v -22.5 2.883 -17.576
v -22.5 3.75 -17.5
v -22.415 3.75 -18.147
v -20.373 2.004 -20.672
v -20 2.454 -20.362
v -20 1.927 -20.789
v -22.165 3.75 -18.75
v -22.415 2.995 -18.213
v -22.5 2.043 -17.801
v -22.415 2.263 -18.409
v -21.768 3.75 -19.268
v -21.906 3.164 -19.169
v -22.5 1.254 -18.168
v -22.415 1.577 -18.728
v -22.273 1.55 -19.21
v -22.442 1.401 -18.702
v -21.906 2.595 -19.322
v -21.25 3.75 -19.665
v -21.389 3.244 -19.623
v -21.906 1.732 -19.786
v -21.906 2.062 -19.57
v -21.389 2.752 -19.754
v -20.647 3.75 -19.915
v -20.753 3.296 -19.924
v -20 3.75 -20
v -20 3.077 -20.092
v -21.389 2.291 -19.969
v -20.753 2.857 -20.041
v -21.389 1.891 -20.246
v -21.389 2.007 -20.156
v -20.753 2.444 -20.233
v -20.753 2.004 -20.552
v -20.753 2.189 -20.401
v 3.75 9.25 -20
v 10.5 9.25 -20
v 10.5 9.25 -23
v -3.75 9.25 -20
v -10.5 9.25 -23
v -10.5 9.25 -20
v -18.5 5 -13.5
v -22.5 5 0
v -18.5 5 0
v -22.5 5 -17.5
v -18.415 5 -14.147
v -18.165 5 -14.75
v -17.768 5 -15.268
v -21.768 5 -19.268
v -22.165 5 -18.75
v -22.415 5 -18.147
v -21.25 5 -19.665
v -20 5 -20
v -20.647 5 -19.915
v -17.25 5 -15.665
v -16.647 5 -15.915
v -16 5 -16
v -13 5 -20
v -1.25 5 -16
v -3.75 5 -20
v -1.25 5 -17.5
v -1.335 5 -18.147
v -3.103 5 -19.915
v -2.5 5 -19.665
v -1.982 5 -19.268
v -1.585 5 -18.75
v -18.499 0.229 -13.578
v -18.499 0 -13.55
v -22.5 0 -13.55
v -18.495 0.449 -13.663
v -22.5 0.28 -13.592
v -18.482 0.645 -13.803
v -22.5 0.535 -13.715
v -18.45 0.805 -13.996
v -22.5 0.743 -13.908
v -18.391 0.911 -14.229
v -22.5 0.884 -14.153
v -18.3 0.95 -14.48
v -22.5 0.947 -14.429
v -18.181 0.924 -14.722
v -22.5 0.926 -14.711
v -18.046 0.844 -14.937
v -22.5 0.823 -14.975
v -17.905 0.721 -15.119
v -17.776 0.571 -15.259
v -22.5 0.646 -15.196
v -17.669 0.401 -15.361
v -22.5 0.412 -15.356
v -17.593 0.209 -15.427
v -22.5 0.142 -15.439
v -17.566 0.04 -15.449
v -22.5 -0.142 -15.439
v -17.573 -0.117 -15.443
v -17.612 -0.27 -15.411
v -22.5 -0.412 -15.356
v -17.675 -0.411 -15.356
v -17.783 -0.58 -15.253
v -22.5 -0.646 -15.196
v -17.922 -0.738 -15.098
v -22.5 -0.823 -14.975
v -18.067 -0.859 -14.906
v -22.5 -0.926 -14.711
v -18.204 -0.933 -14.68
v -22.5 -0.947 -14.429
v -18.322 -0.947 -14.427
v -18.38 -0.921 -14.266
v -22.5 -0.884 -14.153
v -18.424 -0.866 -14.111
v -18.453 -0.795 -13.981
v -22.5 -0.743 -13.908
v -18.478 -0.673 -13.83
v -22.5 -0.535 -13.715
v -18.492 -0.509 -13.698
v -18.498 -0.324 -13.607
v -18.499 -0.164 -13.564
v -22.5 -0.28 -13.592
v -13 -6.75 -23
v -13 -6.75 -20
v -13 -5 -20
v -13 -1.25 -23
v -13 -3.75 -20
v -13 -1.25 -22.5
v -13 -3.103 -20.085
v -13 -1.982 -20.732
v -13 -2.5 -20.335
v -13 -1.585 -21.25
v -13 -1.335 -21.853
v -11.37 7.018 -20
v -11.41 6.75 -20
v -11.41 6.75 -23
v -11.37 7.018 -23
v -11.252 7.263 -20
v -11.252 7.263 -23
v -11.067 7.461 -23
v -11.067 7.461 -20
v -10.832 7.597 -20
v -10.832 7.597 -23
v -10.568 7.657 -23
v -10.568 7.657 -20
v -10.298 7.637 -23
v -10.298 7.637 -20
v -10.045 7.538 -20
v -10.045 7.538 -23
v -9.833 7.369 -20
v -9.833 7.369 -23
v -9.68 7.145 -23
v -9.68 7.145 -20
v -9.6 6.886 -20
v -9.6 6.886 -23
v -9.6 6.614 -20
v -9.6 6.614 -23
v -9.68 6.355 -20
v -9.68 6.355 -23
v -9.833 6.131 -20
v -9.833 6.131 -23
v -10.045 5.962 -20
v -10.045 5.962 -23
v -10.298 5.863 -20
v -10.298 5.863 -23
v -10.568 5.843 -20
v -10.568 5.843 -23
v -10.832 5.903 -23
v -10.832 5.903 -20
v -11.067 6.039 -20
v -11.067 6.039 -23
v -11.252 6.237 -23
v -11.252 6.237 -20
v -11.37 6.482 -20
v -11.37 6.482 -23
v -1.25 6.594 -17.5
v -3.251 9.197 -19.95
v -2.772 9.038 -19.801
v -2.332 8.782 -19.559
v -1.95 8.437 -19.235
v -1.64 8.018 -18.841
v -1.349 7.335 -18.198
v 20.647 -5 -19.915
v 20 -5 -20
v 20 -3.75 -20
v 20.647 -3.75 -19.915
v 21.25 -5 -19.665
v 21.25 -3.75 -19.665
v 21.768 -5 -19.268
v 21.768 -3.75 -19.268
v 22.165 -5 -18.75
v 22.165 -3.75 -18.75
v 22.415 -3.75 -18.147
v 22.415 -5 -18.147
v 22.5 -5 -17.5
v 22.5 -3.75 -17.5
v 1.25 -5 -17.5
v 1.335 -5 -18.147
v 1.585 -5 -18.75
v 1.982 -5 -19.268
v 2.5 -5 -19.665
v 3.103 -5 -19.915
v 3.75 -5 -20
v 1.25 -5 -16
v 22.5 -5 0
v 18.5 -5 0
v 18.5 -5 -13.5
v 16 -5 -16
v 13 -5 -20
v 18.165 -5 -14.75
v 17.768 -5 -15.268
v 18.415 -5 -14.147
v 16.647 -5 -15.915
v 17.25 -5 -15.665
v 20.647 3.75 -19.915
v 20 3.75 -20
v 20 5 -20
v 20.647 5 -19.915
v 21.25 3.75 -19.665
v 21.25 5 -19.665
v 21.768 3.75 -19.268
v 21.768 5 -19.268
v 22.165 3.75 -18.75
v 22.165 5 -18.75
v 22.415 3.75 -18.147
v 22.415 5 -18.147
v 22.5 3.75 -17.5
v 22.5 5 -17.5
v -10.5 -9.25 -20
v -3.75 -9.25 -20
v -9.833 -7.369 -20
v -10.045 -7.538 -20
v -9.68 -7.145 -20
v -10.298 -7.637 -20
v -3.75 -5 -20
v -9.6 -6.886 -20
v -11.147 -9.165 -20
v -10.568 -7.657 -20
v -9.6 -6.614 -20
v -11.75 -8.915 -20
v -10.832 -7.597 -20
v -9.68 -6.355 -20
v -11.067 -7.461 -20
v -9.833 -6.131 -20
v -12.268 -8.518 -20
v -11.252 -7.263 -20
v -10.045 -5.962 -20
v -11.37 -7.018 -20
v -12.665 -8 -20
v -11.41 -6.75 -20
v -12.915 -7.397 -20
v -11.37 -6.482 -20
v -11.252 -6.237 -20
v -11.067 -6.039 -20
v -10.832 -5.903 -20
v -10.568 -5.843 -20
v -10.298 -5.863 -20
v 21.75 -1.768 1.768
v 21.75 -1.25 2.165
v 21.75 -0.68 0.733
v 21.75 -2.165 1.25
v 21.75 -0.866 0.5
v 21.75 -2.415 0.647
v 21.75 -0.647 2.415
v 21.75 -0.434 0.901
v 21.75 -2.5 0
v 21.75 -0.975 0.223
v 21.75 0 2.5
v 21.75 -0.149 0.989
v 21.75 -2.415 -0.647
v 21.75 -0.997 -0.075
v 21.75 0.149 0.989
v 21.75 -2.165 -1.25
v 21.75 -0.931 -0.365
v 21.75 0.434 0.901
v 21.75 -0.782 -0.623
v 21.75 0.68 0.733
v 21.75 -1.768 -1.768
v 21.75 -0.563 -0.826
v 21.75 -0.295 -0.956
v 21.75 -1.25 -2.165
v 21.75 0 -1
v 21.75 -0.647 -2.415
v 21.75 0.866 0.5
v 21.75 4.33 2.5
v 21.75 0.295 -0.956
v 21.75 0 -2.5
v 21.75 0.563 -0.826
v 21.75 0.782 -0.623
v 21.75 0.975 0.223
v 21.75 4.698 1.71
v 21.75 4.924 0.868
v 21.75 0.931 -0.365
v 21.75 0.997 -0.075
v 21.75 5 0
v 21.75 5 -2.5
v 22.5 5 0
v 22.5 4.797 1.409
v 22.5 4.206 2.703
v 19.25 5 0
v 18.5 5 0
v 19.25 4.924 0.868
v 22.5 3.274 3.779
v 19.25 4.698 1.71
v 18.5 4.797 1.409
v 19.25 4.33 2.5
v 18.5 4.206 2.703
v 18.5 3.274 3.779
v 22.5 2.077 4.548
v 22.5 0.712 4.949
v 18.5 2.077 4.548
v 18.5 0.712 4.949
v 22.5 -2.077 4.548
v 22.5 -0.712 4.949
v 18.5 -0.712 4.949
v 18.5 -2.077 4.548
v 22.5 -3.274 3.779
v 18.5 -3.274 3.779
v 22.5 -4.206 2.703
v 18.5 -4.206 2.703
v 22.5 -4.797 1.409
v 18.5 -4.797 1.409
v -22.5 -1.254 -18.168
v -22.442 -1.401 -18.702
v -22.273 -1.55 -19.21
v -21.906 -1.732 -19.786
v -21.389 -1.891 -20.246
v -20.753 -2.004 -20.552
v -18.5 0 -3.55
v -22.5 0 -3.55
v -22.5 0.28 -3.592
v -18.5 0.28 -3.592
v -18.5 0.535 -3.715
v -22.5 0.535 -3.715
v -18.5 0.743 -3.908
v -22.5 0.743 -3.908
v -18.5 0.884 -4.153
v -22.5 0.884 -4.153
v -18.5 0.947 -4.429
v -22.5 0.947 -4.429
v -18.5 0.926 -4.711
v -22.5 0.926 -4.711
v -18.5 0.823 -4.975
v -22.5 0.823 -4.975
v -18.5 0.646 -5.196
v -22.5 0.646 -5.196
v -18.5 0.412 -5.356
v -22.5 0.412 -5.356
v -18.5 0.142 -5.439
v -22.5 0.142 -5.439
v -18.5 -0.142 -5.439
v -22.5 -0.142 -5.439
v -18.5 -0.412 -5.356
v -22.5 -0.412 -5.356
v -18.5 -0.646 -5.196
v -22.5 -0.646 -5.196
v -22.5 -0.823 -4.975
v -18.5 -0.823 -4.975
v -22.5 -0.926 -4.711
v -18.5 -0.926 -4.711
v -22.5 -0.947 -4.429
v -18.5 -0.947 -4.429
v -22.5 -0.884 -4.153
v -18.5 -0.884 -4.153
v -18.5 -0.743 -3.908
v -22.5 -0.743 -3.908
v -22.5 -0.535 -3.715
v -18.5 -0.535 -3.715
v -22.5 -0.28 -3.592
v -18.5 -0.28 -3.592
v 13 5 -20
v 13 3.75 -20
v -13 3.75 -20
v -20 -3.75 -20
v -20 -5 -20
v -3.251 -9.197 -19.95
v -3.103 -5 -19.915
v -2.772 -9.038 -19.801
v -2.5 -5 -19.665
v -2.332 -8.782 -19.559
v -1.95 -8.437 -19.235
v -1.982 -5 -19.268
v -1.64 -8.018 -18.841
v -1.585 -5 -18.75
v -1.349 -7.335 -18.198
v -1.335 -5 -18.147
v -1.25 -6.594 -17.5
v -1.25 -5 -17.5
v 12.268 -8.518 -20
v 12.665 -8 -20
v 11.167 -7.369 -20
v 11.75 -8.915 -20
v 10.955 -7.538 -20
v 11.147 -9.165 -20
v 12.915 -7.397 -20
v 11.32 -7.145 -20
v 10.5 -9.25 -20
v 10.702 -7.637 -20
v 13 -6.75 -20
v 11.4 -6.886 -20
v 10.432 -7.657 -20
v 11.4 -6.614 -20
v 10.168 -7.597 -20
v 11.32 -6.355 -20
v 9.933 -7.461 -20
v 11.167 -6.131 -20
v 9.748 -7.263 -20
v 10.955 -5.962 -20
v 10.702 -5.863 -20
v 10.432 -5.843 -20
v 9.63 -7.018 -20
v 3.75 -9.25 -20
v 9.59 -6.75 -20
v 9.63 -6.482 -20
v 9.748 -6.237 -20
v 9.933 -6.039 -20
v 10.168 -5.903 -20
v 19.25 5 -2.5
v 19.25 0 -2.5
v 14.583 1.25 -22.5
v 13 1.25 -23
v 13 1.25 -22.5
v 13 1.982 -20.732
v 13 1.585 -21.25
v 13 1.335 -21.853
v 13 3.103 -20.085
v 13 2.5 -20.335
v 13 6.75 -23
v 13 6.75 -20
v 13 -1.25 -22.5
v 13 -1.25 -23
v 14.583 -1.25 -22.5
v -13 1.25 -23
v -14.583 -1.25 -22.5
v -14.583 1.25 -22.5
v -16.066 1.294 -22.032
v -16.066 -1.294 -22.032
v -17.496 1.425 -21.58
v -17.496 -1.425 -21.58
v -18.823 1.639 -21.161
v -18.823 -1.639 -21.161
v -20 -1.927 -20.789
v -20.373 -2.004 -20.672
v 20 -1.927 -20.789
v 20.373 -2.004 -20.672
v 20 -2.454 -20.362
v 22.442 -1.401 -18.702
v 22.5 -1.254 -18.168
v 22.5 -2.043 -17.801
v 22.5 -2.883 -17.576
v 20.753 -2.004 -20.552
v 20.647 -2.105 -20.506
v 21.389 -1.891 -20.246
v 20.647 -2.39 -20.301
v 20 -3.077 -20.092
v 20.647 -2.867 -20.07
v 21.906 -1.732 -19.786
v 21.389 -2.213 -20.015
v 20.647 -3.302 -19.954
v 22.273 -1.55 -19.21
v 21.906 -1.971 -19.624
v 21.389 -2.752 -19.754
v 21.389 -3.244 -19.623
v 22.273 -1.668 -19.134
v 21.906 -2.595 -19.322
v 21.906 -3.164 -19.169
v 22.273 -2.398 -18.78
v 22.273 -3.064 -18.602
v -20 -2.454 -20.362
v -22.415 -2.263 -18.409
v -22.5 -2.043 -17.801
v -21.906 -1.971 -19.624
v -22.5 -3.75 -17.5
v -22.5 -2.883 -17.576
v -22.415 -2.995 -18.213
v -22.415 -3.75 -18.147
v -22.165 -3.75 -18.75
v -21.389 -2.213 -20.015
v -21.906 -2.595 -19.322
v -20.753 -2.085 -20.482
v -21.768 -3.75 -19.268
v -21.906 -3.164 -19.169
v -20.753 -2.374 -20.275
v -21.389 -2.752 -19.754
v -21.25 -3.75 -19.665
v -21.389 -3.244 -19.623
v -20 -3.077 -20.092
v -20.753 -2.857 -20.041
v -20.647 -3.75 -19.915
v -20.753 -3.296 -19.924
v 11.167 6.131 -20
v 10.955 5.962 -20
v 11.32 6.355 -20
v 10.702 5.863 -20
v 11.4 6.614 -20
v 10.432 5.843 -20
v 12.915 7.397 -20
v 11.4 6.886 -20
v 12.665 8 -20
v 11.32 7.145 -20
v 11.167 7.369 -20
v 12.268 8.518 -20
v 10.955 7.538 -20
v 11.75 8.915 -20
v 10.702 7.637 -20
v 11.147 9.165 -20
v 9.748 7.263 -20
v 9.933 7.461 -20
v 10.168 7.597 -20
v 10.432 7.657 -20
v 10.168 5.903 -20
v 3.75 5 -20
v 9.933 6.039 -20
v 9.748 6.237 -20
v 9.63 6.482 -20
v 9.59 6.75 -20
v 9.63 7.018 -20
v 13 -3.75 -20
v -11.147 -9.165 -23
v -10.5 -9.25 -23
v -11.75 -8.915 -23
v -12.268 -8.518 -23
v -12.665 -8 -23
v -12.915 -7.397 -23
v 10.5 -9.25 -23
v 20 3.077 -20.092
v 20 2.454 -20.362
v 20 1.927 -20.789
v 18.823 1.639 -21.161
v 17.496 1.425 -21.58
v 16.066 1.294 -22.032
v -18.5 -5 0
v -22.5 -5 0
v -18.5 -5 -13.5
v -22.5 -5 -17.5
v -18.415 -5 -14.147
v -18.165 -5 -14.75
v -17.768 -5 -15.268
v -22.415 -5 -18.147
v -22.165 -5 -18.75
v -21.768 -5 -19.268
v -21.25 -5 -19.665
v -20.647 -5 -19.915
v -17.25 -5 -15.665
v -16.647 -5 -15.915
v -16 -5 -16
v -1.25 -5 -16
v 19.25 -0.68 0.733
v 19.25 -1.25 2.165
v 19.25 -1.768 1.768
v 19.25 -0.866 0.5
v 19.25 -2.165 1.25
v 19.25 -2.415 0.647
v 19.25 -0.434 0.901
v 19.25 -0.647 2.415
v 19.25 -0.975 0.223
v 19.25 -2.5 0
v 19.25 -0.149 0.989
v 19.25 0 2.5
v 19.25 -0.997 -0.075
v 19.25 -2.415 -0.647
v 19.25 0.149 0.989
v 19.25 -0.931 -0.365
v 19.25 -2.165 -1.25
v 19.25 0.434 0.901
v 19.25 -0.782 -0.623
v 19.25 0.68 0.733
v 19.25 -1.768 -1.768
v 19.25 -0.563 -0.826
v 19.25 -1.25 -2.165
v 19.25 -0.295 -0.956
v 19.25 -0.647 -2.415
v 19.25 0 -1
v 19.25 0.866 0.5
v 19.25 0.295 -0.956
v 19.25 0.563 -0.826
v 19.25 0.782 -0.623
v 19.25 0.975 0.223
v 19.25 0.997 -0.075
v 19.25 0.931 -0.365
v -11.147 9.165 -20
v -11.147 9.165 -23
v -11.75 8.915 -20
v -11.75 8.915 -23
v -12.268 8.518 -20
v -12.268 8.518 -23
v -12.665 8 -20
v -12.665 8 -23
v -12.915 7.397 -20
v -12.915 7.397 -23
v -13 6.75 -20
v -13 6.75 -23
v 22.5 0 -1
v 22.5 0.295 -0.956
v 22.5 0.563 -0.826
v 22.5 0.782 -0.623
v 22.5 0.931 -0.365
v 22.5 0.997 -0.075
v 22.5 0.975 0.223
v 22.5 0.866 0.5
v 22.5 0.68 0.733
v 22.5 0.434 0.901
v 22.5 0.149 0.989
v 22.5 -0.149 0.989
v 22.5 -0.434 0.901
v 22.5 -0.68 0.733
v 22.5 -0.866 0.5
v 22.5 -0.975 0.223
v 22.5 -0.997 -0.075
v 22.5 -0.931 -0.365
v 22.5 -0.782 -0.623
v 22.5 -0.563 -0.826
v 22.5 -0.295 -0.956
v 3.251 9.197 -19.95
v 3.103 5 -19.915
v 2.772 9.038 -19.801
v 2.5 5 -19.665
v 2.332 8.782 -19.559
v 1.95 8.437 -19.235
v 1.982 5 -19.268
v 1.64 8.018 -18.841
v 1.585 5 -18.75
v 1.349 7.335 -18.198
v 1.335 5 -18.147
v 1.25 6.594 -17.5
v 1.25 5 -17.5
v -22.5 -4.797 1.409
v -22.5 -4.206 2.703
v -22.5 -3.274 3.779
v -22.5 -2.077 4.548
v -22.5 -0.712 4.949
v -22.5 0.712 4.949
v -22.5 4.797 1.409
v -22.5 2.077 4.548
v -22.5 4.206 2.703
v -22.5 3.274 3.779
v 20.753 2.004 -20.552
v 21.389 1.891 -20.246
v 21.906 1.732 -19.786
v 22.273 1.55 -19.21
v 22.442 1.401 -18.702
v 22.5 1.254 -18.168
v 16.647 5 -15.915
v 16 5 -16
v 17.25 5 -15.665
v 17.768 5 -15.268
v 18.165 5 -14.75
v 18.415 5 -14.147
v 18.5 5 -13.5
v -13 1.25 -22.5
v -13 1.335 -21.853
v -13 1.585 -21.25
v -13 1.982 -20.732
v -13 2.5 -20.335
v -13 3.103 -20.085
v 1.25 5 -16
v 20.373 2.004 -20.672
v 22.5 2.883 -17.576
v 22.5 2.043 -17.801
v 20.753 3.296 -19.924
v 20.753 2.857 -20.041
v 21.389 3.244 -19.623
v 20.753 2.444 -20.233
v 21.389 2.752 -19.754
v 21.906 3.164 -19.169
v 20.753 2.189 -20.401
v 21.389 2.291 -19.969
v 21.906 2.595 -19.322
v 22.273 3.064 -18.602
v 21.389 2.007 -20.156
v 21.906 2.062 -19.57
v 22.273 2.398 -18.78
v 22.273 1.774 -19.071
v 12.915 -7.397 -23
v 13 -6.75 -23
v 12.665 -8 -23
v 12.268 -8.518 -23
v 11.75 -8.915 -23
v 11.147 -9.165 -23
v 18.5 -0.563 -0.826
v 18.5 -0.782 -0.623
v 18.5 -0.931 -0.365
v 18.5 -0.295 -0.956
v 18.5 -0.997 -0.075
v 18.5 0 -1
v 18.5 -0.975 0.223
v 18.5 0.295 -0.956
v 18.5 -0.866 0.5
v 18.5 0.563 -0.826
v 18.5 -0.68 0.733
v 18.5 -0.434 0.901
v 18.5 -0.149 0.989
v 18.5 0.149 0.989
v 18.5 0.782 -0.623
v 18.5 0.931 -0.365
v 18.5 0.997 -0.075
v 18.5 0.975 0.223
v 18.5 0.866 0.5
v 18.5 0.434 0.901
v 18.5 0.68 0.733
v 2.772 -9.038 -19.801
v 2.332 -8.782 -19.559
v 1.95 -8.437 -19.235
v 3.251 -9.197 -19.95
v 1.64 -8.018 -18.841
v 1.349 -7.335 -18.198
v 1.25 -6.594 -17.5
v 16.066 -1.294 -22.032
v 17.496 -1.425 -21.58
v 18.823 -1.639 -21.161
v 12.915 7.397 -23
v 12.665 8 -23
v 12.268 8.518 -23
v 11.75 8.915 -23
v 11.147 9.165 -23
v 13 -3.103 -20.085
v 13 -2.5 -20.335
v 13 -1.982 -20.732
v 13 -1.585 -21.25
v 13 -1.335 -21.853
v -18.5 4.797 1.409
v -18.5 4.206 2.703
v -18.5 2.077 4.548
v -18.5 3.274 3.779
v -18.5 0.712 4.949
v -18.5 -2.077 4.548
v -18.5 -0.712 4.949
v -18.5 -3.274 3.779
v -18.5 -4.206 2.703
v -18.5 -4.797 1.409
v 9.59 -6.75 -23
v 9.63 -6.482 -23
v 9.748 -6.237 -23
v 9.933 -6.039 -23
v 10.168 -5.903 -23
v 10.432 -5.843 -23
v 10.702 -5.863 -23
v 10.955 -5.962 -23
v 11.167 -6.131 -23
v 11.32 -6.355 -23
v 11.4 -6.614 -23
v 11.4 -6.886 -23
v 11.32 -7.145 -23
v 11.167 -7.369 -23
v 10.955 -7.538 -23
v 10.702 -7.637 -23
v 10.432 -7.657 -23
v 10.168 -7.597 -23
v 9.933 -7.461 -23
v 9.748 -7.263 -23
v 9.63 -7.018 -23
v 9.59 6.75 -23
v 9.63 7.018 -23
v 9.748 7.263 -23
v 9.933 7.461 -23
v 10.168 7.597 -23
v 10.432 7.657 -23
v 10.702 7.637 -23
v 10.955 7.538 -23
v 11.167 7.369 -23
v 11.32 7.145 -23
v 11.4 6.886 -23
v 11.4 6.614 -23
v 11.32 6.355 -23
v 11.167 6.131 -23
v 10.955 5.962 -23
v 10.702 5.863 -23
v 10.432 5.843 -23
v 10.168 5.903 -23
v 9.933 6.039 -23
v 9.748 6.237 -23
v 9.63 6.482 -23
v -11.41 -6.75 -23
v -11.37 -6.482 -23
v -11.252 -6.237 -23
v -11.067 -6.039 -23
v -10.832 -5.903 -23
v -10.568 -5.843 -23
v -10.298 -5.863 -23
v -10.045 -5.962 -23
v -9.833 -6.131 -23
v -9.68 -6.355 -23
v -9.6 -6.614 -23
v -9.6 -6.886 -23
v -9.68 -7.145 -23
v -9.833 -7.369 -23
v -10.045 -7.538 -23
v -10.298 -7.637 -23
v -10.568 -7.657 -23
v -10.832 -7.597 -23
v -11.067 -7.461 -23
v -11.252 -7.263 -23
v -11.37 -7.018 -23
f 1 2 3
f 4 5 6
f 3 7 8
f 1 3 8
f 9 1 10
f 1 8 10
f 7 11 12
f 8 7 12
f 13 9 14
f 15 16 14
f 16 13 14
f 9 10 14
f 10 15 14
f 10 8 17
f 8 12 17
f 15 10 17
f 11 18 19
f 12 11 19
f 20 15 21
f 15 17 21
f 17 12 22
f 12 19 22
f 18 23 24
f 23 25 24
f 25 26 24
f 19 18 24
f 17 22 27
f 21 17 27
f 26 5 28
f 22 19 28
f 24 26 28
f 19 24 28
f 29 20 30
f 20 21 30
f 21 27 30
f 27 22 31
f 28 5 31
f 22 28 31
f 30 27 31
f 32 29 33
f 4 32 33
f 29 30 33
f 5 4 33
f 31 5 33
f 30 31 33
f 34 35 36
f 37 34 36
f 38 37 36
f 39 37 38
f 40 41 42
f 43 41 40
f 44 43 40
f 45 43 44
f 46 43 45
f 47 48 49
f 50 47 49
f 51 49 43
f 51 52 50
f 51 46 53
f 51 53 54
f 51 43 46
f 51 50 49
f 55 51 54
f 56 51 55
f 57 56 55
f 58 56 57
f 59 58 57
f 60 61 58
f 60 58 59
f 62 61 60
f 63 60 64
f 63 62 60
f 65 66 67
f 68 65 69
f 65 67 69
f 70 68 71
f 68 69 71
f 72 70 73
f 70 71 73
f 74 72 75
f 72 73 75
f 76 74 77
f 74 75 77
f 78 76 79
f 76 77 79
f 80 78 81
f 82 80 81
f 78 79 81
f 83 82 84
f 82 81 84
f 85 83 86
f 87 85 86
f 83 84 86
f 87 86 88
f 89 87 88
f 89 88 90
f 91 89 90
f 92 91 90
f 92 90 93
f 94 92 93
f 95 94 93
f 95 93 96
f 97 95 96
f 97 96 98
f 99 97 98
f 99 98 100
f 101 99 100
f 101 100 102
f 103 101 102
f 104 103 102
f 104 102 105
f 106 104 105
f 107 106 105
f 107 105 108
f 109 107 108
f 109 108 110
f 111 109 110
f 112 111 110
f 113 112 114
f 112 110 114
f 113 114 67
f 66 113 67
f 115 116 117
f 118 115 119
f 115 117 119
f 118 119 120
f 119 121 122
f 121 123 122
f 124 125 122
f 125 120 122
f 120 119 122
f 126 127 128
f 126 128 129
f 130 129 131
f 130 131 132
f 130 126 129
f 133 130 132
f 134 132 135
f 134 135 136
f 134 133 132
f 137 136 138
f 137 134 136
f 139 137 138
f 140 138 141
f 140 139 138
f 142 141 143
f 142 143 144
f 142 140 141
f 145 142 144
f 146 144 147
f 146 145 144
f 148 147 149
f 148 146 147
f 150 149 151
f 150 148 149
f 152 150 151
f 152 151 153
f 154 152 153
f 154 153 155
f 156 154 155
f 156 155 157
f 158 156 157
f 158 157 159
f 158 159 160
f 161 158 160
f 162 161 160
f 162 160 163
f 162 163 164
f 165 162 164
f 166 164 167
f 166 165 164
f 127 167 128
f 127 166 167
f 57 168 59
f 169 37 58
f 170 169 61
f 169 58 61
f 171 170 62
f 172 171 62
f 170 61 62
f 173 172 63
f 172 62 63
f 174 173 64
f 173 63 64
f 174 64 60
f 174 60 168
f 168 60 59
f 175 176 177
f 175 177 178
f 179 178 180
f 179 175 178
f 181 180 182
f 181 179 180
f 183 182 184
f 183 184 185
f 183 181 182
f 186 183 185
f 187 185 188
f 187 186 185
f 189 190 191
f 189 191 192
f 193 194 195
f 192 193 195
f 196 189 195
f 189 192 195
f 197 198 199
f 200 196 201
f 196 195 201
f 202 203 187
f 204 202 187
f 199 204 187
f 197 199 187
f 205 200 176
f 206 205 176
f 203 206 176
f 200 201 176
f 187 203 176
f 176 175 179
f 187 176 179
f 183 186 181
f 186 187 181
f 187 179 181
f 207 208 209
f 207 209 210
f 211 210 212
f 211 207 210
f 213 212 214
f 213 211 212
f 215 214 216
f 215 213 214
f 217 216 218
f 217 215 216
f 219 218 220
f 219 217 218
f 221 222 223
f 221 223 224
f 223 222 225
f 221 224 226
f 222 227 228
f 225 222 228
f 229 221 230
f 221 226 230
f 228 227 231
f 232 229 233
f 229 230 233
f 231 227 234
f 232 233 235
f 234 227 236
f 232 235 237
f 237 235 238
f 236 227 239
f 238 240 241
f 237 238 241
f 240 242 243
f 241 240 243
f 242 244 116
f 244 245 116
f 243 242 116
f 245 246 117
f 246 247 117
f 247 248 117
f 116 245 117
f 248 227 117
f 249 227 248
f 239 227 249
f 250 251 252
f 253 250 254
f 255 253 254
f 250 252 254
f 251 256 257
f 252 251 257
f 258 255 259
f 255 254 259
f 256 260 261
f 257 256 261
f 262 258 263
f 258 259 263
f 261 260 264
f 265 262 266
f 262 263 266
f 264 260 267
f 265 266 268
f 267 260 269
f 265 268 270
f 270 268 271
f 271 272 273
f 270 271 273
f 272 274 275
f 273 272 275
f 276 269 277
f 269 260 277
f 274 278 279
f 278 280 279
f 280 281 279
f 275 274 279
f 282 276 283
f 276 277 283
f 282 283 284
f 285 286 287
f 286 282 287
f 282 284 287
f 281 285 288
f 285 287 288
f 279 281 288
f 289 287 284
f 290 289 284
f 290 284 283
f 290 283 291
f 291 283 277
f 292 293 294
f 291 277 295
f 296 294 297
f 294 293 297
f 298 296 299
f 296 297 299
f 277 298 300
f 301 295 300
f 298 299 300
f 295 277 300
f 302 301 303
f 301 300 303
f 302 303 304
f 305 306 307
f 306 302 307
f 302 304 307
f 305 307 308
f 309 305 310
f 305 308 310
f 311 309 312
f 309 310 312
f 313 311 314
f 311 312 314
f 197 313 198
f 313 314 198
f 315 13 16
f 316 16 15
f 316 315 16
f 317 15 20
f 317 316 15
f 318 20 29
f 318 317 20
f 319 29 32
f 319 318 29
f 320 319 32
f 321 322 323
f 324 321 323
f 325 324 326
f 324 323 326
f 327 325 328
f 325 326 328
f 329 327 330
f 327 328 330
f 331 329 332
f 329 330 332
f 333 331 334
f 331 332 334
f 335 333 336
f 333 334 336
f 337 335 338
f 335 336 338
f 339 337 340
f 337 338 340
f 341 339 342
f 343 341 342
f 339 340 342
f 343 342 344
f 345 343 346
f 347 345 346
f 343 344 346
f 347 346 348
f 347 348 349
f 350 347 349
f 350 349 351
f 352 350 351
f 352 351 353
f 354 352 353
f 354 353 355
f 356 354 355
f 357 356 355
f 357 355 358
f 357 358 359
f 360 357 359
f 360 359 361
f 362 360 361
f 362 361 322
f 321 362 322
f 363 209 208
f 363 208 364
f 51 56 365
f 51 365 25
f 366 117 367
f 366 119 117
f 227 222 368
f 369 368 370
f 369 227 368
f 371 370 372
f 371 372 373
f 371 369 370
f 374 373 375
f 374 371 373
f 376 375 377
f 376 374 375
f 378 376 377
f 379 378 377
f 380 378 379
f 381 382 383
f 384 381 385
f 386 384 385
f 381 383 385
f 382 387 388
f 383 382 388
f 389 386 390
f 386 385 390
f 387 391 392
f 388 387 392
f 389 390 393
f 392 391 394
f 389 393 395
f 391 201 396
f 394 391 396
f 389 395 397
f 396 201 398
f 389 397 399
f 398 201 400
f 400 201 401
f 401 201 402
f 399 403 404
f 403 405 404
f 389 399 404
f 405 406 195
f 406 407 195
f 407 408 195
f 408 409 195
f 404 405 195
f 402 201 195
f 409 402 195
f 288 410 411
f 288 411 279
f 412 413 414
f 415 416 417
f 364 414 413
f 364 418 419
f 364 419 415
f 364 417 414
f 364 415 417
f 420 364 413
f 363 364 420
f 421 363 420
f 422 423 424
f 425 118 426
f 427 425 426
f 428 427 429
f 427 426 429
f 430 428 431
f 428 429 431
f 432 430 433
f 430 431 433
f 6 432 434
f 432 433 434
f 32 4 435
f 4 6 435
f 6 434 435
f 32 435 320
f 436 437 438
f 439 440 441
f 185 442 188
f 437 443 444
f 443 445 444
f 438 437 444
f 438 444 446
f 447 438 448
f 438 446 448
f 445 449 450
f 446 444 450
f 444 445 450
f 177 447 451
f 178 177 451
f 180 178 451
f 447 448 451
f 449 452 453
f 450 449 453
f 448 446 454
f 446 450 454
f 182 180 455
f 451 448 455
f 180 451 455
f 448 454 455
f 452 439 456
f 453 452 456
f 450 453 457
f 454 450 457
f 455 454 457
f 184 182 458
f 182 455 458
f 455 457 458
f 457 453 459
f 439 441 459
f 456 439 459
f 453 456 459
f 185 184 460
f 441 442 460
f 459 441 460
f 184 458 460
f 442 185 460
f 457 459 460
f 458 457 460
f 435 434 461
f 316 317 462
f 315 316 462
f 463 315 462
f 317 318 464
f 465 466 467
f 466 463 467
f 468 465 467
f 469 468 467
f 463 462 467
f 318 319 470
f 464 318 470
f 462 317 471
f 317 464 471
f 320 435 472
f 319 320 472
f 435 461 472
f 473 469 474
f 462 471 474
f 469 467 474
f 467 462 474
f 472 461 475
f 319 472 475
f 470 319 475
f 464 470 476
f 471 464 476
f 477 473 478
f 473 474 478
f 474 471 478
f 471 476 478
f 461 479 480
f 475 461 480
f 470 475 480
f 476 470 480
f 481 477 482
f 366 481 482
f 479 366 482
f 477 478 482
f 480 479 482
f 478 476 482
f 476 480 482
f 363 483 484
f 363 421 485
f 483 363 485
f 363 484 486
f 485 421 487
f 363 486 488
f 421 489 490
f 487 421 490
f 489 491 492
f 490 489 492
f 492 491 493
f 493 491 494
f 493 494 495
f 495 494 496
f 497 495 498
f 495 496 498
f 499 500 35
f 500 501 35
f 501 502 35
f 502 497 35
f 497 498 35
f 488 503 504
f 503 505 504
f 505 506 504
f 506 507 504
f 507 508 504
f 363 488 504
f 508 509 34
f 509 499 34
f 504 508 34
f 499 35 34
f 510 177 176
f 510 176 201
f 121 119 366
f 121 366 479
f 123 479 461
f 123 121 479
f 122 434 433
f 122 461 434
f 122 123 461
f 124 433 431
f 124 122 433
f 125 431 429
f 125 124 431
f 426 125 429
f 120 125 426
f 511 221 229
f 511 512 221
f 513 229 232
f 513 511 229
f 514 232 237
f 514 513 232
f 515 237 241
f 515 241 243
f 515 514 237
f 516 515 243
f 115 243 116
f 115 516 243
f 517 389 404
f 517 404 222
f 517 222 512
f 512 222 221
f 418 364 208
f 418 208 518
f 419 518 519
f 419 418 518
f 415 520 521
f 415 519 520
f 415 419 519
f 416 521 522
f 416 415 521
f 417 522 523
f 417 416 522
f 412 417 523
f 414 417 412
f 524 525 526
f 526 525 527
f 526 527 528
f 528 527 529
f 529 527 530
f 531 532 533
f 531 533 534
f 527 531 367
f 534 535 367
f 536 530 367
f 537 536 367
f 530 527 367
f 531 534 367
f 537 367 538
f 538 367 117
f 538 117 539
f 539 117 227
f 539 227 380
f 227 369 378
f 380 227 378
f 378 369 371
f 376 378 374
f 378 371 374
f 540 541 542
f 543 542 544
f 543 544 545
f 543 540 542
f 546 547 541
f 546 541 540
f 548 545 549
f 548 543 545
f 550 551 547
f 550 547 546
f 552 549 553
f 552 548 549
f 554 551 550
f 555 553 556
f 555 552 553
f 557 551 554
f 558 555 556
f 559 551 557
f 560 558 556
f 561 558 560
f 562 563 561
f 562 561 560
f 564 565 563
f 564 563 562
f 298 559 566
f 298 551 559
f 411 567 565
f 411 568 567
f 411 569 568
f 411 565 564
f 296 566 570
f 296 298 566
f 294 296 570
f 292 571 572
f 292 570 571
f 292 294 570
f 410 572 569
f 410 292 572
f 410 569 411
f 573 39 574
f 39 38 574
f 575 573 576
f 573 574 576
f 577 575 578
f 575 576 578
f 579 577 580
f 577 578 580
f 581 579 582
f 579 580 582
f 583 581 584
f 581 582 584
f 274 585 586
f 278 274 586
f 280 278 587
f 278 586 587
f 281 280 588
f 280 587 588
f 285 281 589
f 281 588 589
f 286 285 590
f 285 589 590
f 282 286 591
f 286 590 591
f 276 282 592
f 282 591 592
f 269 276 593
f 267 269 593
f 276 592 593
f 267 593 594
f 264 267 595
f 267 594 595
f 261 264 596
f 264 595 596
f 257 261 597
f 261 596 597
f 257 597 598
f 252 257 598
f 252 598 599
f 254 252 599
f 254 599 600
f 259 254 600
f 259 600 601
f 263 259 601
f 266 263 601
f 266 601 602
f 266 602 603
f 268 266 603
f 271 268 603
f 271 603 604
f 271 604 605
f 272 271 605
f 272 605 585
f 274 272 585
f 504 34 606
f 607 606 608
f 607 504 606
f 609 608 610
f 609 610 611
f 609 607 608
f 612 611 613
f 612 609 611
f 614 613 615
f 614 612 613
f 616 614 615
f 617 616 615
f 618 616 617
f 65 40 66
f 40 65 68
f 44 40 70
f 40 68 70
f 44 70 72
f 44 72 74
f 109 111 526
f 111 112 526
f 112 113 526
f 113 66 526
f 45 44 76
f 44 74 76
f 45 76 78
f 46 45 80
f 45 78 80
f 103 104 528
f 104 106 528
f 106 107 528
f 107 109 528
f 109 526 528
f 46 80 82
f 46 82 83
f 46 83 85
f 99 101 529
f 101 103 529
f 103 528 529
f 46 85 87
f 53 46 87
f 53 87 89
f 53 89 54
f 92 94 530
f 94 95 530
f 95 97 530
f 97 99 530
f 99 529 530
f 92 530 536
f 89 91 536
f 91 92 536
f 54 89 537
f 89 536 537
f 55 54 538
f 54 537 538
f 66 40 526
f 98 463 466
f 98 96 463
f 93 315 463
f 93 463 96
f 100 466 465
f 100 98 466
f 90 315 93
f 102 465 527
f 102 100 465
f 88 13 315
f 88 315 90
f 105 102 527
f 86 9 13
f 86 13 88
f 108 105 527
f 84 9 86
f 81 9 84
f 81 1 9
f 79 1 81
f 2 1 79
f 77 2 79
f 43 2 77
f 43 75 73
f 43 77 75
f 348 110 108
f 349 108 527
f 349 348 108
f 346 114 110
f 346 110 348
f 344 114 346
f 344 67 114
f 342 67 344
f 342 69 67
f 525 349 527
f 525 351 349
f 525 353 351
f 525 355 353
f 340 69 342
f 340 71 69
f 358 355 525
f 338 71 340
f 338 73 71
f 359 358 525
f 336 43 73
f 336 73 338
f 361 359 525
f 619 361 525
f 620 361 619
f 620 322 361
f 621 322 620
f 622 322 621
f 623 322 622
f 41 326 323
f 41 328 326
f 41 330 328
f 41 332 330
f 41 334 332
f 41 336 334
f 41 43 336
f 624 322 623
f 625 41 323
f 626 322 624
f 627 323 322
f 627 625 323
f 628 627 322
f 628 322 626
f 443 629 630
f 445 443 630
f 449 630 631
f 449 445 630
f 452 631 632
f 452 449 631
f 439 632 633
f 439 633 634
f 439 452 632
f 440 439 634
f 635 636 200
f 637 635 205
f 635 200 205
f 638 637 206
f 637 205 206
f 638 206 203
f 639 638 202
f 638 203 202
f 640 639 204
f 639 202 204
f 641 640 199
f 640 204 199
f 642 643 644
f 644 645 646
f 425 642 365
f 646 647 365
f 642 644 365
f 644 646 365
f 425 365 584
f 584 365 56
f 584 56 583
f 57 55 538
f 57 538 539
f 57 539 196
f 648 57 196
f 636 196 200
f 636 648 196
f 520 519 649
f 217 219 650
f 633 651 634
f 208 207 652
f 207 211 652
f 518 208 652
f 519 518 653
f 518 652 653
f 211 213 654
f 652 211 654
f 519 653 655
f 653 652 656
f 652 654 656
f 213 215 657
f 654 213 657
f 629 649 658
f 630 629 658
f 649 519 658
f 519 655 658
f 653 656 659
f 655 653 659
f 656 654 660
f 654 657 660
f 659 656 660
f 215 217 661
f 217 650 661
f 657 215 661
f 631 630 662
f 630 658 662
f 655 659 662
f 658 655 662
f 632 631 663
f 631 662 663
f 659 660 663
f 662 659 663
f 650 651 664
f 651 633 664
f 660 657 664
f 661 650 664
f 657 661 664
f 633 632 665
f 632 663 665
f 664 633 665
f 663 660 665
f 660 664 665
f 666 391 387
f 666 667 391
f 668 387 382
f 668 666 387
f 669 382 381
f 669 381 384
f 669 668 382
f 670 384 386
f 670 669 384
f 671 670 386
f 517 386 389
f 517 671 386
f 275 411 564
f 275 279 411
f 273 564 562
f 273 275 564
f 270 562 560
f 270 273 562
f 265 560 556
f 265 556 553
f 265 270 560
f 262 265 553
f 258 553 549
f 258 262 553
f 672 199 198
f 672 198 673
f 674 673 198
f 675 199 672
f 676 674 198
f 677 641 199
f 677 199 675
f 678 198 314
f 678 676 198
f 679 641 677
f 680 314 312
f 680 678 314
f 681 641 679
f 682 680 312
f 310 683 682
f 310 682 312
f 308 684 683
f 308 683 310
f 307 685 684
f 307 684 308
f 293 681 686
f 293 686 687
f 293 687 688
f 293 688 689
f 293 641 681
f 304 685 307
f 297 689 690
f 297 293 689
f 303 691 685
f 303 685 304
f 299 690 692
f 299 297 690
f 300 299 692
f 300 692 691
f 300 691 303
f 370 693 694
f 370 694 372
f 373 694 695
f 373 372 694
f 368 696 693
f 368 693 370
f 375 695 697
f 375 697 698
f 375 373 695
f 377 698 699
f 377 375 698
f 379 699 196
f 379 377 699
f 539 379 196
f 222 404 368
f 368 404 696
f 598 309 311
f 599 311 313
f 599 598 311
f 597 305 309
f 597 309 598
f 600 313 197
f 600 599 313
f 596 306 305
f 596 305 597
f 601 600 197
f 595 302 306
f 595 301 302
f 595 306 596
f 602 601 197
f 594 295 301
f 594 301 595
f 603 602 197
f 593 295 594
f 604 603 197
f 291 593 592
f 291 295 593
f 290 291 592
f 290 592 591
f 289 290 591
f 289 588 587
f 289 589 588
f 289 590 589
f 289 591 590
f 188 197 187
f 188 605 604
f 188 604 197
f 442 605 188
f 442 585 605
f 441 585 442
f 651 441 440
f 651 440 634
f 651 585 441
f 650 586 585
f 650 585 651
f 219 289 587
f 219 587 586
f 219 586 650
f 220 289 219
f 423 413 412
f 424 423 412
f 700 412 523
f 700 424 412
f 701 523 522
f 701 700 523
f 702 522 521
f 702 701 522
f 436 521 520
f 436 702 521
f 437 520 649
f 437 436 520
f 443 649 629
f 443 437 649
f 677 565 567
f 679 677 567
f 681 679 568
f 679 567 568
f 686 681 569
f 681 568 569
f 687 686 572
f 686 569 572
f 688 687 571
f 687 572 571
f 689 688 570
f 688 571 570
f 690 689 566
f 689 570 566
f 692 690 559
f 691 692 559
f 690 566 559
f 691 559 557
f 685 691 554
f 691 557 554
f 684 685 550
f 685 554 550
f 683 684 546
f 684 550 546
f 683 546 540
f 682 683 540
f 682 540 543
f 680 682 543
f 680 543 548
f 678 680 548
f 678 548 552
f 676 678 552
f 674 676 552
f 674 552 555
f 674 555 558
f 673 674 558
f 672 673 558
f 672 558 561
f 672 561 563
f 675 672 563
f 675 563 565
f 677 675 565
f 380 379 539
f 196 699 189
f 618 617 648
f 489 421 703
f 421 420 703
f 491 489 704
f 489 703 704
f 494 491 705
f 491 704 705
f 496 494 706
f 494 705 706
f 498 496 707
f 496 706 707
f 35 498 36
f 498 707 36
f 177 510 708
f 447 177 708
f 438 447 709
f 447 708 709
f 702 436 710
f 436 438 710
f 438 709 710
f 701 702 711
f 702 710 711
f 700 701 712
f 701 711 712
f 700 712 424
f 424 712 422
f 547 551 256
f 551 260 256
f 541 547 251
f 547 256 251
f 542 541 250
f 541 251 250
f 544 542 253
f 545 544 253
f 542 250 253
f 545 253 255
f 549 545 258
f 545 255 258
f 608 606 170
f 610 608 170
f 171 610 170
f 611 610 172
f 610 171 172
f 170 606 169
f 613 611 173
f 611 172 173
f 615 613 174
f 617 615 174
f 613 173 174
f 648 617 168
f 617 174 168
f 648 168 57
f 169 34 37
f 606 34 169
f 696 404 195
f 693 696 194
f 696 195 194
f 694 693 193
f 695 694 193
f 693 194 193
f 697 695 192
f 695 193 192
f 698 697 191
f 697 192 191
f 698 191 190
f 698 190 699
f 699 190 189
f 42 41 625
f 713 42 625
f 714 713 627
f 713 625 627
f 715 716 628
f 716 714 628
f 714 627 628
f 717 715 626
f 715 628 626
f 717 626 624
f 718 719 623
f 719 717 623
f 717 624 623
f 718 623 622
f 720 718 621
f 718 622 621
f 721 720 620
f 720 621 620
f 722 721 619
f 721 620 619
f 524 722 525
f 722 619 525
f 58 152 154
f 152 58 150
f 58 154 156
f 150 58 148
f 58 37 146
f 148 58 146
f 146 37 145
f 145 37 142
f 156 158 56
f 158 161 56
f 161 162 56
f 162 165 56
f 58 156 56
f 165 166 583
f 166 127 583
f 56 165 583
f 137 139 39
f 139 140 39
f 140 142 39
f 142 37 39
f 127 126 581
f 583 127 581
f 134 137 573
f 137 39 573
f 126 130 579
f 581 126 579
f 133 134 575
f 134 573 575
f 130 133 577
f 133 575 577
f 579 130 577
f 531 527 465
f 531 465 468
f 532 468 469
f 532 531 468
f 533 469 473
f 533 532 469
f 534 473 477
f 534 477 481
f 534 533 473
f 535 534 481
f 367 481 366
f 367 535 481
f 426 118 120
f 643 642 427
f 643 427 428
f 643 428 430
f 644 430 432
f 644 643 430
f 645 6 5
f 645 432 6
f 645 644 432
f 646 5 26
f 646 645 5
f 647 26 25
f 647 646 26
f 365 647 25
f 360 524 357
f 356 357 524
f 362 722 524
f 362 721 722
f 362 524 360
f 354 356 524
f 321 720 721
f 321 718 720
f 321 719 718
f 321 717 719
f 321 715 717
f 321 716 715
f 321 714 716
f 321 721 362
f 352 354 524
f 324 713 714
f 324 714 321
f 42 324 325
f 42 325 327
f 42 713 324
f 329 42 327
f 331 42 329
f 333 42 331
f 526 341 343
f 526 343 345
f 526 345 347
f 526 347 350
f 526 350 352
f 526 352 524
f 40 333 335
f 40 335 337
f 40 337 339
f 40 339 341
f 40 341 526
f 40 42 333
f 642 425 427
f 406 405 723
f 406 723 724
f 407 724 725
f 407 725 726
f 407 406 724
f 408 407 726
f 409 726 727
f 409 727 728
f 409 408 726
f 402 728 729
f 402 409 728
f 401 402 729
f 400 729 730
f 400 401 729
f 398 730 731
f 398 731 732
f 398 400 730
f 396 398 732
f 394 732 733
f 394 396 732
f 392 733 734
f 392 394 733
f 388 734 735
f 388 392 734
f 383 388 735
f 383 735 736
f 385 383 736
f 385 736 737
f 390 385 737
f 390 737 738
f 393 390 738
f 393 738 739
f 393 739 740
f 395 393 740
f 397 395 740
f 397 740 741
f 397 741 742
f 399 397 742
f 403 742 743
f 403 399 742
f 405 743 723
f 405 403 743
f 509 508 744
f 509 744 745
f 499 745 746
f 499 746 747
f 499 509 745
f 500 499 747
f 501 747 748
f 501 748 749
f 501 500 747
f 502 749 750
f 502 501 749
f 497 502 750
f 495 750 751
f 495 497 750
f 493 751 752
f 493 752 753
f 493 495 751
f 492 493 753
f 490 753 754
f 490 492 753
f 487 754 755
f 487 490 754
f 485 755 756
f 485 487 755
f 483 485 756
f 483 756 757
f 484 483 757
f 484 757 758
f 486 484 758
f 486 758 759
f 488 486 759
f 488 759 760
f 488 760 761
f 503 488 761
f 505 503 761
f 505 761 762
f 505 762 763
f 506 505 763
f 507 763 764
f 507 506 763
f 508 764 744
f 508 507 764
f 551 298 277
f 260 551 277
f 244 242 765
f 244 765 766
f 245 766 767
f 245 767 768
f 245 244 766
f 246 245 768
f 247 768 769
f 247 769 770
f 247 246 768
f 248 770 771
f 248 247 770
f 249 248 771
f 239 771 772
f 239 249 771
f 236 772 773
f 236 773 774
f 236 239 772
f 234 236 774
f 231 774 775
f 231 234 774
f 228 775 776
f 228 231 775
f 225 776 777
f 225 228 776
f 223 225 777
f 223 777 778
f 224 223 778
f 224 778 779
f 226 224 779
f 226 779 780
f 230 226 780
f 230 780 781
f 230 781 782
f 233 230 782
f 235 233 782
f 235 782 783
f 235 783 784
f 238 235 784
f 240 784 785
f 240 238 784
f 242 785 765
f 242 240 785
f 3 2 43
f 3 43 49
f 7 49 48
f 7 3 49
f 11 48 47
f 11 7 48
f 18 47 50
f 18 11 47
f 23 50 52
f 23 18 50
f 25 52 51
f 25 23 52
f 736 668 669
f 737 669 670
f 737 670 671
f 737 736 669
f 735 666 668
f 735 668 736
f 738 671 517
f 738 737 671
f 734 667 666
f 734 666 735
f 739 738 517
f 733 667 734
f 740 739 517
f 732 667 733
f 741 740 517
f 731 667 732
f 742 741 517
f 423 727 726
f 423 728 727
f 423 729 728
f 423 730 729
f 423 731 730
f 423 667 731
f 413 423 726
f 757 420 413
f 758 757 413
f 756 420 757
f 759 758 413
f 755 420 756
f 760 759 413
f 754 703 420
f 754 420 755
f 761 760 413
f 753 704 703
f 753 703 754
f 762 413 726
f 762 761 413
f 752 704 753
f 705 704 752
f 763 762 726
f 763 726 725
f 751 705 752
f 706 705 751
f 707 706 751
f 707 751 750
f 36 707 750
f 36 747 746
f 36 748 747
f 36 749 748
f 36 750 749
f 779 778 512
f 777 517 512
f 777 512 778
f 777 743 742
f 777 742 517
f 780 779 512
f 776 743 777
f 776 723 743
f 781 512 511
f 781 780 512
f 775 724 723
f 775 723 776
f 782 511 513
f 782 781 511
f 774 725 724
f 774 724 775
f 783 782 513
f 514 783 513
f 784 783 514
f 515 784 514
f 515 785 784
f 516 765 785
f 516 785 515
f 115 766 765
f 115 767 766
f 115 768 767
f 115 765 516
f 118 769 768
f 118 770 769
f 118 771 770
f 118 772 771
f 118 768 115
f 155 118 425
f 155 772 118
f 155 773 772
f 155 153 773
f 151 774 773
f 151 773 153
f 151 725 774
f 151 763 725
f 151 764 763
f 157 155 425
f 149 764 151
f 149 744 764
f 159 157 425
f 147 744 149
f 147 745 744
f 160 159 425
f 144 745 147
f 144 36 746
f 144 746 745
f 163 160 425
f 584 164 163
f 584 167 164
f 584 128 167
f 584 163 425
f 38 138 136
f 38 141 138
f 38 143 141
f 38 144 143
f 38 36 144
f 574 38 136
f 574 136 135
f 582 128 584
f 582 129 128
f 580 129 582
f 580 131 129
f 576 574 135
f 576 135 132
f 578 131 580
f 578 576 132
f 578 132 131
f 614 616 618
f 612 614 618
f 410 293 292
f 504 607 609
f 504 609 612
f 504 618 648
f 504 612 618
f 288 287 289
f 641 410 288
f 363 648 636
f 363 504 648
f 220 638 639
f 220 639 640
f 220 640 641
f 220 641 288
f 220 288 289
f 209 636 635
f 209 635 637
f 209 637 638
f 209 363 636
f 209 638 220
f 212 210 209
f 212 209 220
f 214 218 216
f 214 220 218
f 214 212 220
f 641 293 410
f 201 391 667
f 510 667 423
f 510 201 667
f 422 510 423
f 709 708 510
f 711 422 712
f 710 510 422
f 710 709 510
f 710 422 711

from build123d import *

# Parameters (mm, degrees)
BOSS_EXTRU_1_DEPTH      = 5
ESQUISSE4_W             = 2.5
ESQUISSE4_H             = 5
ENL_V_MAT_EXTRU_1_DEPTH = 7.5
ENL_V_MAT_EXTRU_2_REACH = 51.497
ESQUISSE5_R             = 1
CONG_1_R                = 2.5
CONG_2_R                = 5
ESQUISSE6_W             = 26
ESQUISSE6_H             = 18.5
ESQUISSE6_R             = 0.91
BOSS_EXTRU_2_DEPTH      = 3
NERVURE4_REACH          = 35.479
ESQUISSE7_WALL_W        = 74.793384568
ESQUISSE7_WALL_H        = 2.5
NERVURE5_REACH          = 35.479
ESQUISSE8_WALL_W        = 78.919505224
ESQUISSE8_WALL_H        = 2.5
CONG_3_R                = 2.5
CONG_4_START            = -2.015218214
CONG_4_3_DEPTH          = 4.030436428
CONG_4_START_2          = 3.7499999
CONG_4_4_DEPTH          = 1.2500001
CONG_4_START_3          = -5
CONG_4_5_DEPTH          = 1.25
CONG_4_6_DEPTH          = 10
ENL_V_MAT_EXTRU_3_REACH = 53.377
ESQUISSE9_R             = 0.95


with BuildPart() as part:
    # Esquisse2 → Boss.-Extru.1 (new, symmetric)
    with BuildSketch(Plane(origin=(0, 0, 0), x_dir=(1, 0, 0), z_dir=(0, 1, 0))):
        Polygon((-18.5, -5), (-18.5, 16), (18.5, 16), (18.5, -5), (22.5, -5), (22.5, 20), (-22.5, 20), (-22.5, -5), align=None)
    extrude(amount=BOSS_EXTRU_1_DEPTH, both=True)

    # Esquisse4 → Enlèv. mat.-Extru.1 (cut)
    with BuildSketch(Plane(origin=(0, 5, 0), x_dir=(1, 0, 0), z_dir=(0, 1, 0))):
        with Locations((20.5, 0)):
            Rectangle(ESQUISSE4_W, ESQUISSE4_H)
    extrude(amount=-ENL_V_MAT_EXTRU_1_DEPTH, mode=Mode.SUBTRACT)

    # Enlèv. mat.-Extru.2: up to this face of the body (flat: up to its plane)
    enl_v_mat_extru_2_end = Plane(part.part.faces().sort_by_distance((18.5, 0, -5.5))[0])
    # Esquisse5 → Enlèv. mat.-Extru.2 (cut, up to the picked face)
    with BuildSketch(Plane(origin=(22.5, 0, 0), x_dir=(0, 0, -1), z_dir=(1, 0, 0)), mode=Mode.PRIVATE) as enl_v_mat_extru_2_sk1:
        Circle(ESQUISSE5_R)
    enl_v_mat_extru_2_tool1 = split(extrude(enl_v_mat_extru_2_sk1.sketch, amount=-ENL_V_MAT_EXTRU_2_REACH, mode=Mode.PRIVATE), bisect_by=enl_v_mat_extru_2_end, keep=Keep.BOTH, mode=Mode.PRIVATE)
    add(enl_v_mat_extru_2_tool1.solids().sort_by(Axis((22.5, 0, 0), (-1, 0, 0)))[0], mode=Mode.SUBTRACT)

    # Congé1
    cong_1_edges = [part.edges().sort_by_distance(p)[0] for p in [
        (20.5, -2.5, 2.5),
        (20.5, -2.5, -2.5),
    ]]
    fillet(cong_1_edges, radius=CONG_1_R - 0.0001)  # a hair under: the kernel refuses the full size

    # Congé2
    # the kernel refuses this fillet: 5 mm, written as the material it takes off along each edge
    with BuildSketch(Plane(origin=(-35, -5, 5), x_dir=(0, 1, 0), z_dir=(1, 0, 0)), Plane(origin=(-35, 5, 5), x_dir=(0, 0, -1), z_dir=(1, 0, 0)), Plane(origin=(6, -5, 5), x_dir=(0, 1, 0), z_dir=(1, 0, 0)), Plane(origin=(6, 5, 5), x_dir=(0, 0, -1), z_dir=(1, 0, 0))) as cong_2_piece_1:
        with BuildLine():
            CenterArc((CONG_2_R, -CONG_2_R), CONG_2_R, 90, 90)
            Line((0, -CONG_2_R), (0, 0))
            Line((0, 0), (CONG_2_R, 0))
        make_face()
    extrude(amount=29, mode=Mode.SUBTRACT)

    # Esquisse6 → Boss.-Extru.2 (add)
    with BuildSketch(Plane(origin=(0, 0, -20), x_dir=(-1, 0, 0), z_dir=(0, 0, -1))):
        Rectangle(ESQUISSE6_W, ESQUISSE6_H)
        with Locations((-10.5, 6.75)):
            Circle(ESQUISSE6_R, mode=Mode.SUBTRACT)
        with Locations((10.5, 6.75)):
            Circle(ESQUISSE6_R, mode=Mode.SUBTRACT)
        with Locations((10.5, -6.75)):
            Circle(ESQUISSE6_R, mode=Mode.SUBTRACT)
        with Locations((-10.5, -6.75)):
            Circle(ESQUISSE6_R, mode=Mode.SUBTRACT)
    extrude(amount=BOSS_EXTRU_2_DEPTH)

    # Esquisse7 wall → Nervure4 (add, up to next)
    with BuildSketch(Plane(origin=(0, 7.125, -18), x_dir=(0, -0.728199992693, 0.685364699005), z_dir=(0, -0.685364699005, -0.728199992693)), mode=Mode.PRIVATE) as nervure4_sk1:
        Rectangle(ESQUISSE7_WALL_W, ESQUISSE7_WALL_H)
    nervure4_tool1 = extrude(nervure4_sk1.sketch, amount=NERVURE4_REACH, mode=Mode.PRIVATE) - part.part
    nervure4 = nervure4_tool1.solids().sort_by_distance((0, 7.125, -18))[0]
    add(nervure4)

    # Symétrie1: Nervure4 across plane
    add(nervure4.mirror(Plane.ZX))

    # Esquisse8 wall → Nervure5 (add, up to next)
    with BuildSketch(Plane(origin=(17.75, 0, -21.5), x_dir=(0.953582665134, 0, 0.301131367937), z_dir=(0.301131367937, 0, -0.953582665134)), mode=Mode.PRIVATE) as nervure5_sk1:
        Rectangle(ESQUISSE8_WALL_W, ESQUISSE8_WALL_H)
    nervure5_tool1 = extrude(nervure5_sk1.sketch, amount=-NERVURE5_REACH, mode=Mode.PRIVATE) - part.part
    nervure5 = nervure5_tool1.solids().sort_by_distance((17.75, 0, -21.5))[0]
    add(nervure5)

    # Symétrie2: Nervure5 across plane
    add(nervure5.mirror(Plane(origin=(0, 0, 0), x_dir=(0, 0, 1), z_dir=(1, 0, 0))))

    # Congé3
    cong_3_edges = [part.edges().sort_by_distance(p)[0] for p in [
        (1.25, 7.125, -20),
        (-1.25, 7.125, -20),
        (-1.25, -7.125, -20),
        (1.25, -7.125, -20),
        (17.75, 1.25, -20),
        (17.75, -1.25, -20),
        (-17.75, -1.25, -20),
        (-17.75, 1.25, -20),
        (-13, -9.25, -21.5),
        (-13, 9.25, -21.5),
        (13, 9.25, -21.5),
        (13, -9.25, -21.5),
    ]]
    fillet(cong_3_edges, radius=CONG_3_R)

    # Congé4: read off the stored shape, not the designer's step
    # Congé4 outline → Congé4 (revolve, cut)
    with BuildSketch(Plane(origin=(0, 3.75, -22.5), x_dir=(0, 1, 0), z_dir=(0, 0, -1))):
        with BuildLine():
            Line((2.5, 22.5), (2.5, 20))
            ThreePointArc((2.5, 20), (3.232233047, 21.767766953), (5, 22.5))
            Line((5, 22.5), (2.5, 22.5))
        make_face()
        with BuildLine():
            ThreePointArc((5, -22.5), (3.232233047, -21.767766953), (2.5, -20))
            Line((2.5, -20), (2.5, -22.5))
            Line((2.5, -22.5), (5, -22.5))
        make_face()
    revolve(axis=Axis((0, 3.75, -22.5), (1, 0, 0)), mode=Mode.SUBTRACT)

    # Cong_4 2 outline → Cong_4 2 (revolve, cut)
    with BuildSketch(Plane(origin=(0, -3.75, -22.5), x_dir=(0, 1, 0), z_dir=(0, 0, -1))):
        with BuildLine():
            Line((2.5, 22.5), (2.5, 20))
            ThreePointArc((2.5, 20), (3.232233047, 21.767766953), (5, 22.5))
            Line((5, 22.5), (2.5, 22.5))
        make_face()
        with BuildLine():
            ThreePointArc((5, -22.5), (3.232233047, -21.767766953), (2.5, -20))
            Line((2.5, -20), (2.5, -22.5))
            Line((2.5, -22.5), (5, -22.5))
        make_face()
    revolve(axis=Axis((0, -3.75, -22.5), (1, 0, 0)), mode=Mode.SUBTRACT)

    # Cong_4 3 outline → Cong_4 3 (cut)
    with BuildSketch(Plane(origin=(0, 0, 0), x_dir=(1, 0, 0), z_dir=(0, 1, 0)).offset(CONG_4_START)):
        with BuildLine():
            Line((22.5, 18.167781731), (22.5, 15.999999998))
            Line((22.5, 15.999999998), (24, 15.999999998))
            Line((24, 15.999999998), (24, 19.52631579))
            Line((24, 19.52631579), (22.449089048, 20.016077143))
            Line((22.449089048, 20.016077143), (20.75282842, 20.551738394))
            ThreePointArc((20.75282842, 20.551738394), (22.016441302, 19.645605968), (22.5, 18.167781731))
        make_face()
        with BuildLine():
            Line((-24, 15.999999998), (-22.5, 15.999999998))
            Line((-22.5, 15.999999998), (-22.5, 18.167781731))
            ThreePointArc((-22.5, 18.167781731), (-22.016441302, 19.645605968), (-20.75282842, 20.551738394))
            Line((-20.75282842, 20.551738394), (-22.449089048, 20.016077143))
            Line((-22.449089048, 20.016077143), (-24, 19.52631579))
            Line((-24, 19.52631579), (-24, 15.999999998))
        make_face()
    extrude(amount=CONG_4_3_DEPTH, mode=Mode.SUBTRACT)

    # Cong_4 4 outline → Cong_4 4 (cut)
    with BuildSketch(Plane(origin=(0, 0, 0), x_dir=(1, 0, 0), z_dir=(0, 1, 0)).offset(CONG_4_START_2)):
        with BuildLine():
            Line((18.5, 20), (20, 20))
            ThreePointArc((20, 20), (21.767766953, 19.267766953), (22.5, 17.5))
            Line((22.5, 17.5), (22.5, 18.167781731))
            ThreePointArc((22.5, 18.167781731), (22.016441302, 19.645605968), (20.75282842, 20.551738394))
            Line((20.75282842, 20.551738394), (18.5, 21.263157895))
            Line((18.5, 21.263157895), (18.5, 20))
        make_face()
        with BuildLine():
            Line((-18.5, 20), (-18.5, 21.263157895))
            Line((-18.5, 21.263157895), (-20.75282842, 20.551738394))
            ThreePointArc((-20.75282842, 20.551738394), (-22.016441302, 19.645605968), (-22.5, 18.167781731))
            Line((-22.5, 18.167781731), (-22.5, 17.5))
            ThreePointArc((-22.5, 17.5), (-21.767766953, 19.267766953), (-20, 20))
            Line((-20, 20), (-18.5, 20))
        make_face()
    extrude(amount=CONG_4_4_DEPTH, mode=Mode.SUBTRACT)

    # Cong_4 5 outline → Cong_4 5 (cut)
    with BuildSketch(Plane(origin=(0, 0, 0), x_dir=(1, 0, 0), z_dir=(0, 1, 0)).offset(CONG_4_START_3)):
        with BuildLine():
            Line((18.5, 20), (20, 20))
            ThreePointArc((20, 20), (21.767766953, 19.267766953), (22.5, 17.5))
            Line((22.5, 17.5), (22.5, 18.167781731))
            ThreePointArc((22.5, 18.167781731), (22.016441302, 19.645605968), (20.75282842, 20.551738394))
            Line((20.75282842, 20.551738394), (18.5, 21.263157895))
            Line((18.5, 21.263157895), (18.5, 20))
        make_face()
        with BuildLine():
            Line((-18.5, 20), (-18.5, 21.263157895))
            Line((-18.5, 21.263157895), (-20.75282842, 20.551738394))
            ThreePointArc((-20.75282842, 20.551738394), (-22.016441302, 19.645605968), (-22.5, 18.167781731))
            Line((-22.5, 18.167781731), (-22.5, 17.5))
            ThreePointArc((-22.5, 17.5), (-21.767766953, 19.267766953), (-20, 20))
            Line((-20, 20), (-18.5, 20))
        make_face()
    extrude(amount=CONG_4_5_DEPTH, mode=Mode.SUBTRACT)

    # Cong_4 6 outline → Cong_4 6 (add)
    with BuildSketch(Plane(origin=(0, 0, 0), x_dir=(1, 0, 0), z_dir=(0, 1, 0)).offset(CONG_4_START_3)):
        with BuildLine():
            Line((18.5, 13.5), (18.5, 16))
            Line((18.5, 16), (16, 16))
            ThreePointArc((16, 16), (17.767766953, 15.267766953), (18.5, 13.5))
        make_face()
        with BuildLine():
            ThreePointArc((-18.5, 13.5), (-17.767766953, 15.267766953), (-16, 16))
            Line((-16, 16), (-18.5, 15.999999998))
            Line((-18.5, 15.999999998), (-18.5, 13.5))
        make_face()
    extrude(amount=CONG_4_6_DEPTH)

    # Esquisse9 → Enlèv. mat.-Extru.3 (cut, up to next)
    with BuildSketch(Plane.ZY.offset(22.5), mode=Mode.PRIVATE) as enl_v_mat_extru_3_sk1:
        with Locations((-4.5, 0)):
            Circle(ESQUISSE9_R)
    enl_v_mat_extru_3_tool1 = extrude(enl_v_mat_extru_3_sk1.sketch, amount=-ENL_V_MAT_EXTRU_3_REACH, mode=Mode.PRIVATE) & part.part
    # Esquisse9 → Enlèv. mat.-Extru.3 (cut, up to next)
    with BuildSketch(Plane.ZY.offset(22.5), mode=Mode.PRIVATE) as enl_v_mat_extru_3_sk2:
        with Locations((-14.5, 0)):
            Circle(ESQUISSE9_R)
    enl_v_mat_extru_3_tool2 = extrude(enl_v_mat_extru_3_sk2.sketch, amount=-ENL_V_MAT_EXTRU_3_REACH, mode=Mode.PRIVATE) & part.part
    add(enl_v_mat_extru_3_tool1.solids().sort_by_distance((-22.5, 0, -4.5))[0], mode=Mode.SUBTRACT)
    add(enl_v_mat_extru_3_tool2.solids().sort_by_distance((-22.5, 0, -14.5))[0], mode=Mode.SUBTRACT)


solid = part.part
